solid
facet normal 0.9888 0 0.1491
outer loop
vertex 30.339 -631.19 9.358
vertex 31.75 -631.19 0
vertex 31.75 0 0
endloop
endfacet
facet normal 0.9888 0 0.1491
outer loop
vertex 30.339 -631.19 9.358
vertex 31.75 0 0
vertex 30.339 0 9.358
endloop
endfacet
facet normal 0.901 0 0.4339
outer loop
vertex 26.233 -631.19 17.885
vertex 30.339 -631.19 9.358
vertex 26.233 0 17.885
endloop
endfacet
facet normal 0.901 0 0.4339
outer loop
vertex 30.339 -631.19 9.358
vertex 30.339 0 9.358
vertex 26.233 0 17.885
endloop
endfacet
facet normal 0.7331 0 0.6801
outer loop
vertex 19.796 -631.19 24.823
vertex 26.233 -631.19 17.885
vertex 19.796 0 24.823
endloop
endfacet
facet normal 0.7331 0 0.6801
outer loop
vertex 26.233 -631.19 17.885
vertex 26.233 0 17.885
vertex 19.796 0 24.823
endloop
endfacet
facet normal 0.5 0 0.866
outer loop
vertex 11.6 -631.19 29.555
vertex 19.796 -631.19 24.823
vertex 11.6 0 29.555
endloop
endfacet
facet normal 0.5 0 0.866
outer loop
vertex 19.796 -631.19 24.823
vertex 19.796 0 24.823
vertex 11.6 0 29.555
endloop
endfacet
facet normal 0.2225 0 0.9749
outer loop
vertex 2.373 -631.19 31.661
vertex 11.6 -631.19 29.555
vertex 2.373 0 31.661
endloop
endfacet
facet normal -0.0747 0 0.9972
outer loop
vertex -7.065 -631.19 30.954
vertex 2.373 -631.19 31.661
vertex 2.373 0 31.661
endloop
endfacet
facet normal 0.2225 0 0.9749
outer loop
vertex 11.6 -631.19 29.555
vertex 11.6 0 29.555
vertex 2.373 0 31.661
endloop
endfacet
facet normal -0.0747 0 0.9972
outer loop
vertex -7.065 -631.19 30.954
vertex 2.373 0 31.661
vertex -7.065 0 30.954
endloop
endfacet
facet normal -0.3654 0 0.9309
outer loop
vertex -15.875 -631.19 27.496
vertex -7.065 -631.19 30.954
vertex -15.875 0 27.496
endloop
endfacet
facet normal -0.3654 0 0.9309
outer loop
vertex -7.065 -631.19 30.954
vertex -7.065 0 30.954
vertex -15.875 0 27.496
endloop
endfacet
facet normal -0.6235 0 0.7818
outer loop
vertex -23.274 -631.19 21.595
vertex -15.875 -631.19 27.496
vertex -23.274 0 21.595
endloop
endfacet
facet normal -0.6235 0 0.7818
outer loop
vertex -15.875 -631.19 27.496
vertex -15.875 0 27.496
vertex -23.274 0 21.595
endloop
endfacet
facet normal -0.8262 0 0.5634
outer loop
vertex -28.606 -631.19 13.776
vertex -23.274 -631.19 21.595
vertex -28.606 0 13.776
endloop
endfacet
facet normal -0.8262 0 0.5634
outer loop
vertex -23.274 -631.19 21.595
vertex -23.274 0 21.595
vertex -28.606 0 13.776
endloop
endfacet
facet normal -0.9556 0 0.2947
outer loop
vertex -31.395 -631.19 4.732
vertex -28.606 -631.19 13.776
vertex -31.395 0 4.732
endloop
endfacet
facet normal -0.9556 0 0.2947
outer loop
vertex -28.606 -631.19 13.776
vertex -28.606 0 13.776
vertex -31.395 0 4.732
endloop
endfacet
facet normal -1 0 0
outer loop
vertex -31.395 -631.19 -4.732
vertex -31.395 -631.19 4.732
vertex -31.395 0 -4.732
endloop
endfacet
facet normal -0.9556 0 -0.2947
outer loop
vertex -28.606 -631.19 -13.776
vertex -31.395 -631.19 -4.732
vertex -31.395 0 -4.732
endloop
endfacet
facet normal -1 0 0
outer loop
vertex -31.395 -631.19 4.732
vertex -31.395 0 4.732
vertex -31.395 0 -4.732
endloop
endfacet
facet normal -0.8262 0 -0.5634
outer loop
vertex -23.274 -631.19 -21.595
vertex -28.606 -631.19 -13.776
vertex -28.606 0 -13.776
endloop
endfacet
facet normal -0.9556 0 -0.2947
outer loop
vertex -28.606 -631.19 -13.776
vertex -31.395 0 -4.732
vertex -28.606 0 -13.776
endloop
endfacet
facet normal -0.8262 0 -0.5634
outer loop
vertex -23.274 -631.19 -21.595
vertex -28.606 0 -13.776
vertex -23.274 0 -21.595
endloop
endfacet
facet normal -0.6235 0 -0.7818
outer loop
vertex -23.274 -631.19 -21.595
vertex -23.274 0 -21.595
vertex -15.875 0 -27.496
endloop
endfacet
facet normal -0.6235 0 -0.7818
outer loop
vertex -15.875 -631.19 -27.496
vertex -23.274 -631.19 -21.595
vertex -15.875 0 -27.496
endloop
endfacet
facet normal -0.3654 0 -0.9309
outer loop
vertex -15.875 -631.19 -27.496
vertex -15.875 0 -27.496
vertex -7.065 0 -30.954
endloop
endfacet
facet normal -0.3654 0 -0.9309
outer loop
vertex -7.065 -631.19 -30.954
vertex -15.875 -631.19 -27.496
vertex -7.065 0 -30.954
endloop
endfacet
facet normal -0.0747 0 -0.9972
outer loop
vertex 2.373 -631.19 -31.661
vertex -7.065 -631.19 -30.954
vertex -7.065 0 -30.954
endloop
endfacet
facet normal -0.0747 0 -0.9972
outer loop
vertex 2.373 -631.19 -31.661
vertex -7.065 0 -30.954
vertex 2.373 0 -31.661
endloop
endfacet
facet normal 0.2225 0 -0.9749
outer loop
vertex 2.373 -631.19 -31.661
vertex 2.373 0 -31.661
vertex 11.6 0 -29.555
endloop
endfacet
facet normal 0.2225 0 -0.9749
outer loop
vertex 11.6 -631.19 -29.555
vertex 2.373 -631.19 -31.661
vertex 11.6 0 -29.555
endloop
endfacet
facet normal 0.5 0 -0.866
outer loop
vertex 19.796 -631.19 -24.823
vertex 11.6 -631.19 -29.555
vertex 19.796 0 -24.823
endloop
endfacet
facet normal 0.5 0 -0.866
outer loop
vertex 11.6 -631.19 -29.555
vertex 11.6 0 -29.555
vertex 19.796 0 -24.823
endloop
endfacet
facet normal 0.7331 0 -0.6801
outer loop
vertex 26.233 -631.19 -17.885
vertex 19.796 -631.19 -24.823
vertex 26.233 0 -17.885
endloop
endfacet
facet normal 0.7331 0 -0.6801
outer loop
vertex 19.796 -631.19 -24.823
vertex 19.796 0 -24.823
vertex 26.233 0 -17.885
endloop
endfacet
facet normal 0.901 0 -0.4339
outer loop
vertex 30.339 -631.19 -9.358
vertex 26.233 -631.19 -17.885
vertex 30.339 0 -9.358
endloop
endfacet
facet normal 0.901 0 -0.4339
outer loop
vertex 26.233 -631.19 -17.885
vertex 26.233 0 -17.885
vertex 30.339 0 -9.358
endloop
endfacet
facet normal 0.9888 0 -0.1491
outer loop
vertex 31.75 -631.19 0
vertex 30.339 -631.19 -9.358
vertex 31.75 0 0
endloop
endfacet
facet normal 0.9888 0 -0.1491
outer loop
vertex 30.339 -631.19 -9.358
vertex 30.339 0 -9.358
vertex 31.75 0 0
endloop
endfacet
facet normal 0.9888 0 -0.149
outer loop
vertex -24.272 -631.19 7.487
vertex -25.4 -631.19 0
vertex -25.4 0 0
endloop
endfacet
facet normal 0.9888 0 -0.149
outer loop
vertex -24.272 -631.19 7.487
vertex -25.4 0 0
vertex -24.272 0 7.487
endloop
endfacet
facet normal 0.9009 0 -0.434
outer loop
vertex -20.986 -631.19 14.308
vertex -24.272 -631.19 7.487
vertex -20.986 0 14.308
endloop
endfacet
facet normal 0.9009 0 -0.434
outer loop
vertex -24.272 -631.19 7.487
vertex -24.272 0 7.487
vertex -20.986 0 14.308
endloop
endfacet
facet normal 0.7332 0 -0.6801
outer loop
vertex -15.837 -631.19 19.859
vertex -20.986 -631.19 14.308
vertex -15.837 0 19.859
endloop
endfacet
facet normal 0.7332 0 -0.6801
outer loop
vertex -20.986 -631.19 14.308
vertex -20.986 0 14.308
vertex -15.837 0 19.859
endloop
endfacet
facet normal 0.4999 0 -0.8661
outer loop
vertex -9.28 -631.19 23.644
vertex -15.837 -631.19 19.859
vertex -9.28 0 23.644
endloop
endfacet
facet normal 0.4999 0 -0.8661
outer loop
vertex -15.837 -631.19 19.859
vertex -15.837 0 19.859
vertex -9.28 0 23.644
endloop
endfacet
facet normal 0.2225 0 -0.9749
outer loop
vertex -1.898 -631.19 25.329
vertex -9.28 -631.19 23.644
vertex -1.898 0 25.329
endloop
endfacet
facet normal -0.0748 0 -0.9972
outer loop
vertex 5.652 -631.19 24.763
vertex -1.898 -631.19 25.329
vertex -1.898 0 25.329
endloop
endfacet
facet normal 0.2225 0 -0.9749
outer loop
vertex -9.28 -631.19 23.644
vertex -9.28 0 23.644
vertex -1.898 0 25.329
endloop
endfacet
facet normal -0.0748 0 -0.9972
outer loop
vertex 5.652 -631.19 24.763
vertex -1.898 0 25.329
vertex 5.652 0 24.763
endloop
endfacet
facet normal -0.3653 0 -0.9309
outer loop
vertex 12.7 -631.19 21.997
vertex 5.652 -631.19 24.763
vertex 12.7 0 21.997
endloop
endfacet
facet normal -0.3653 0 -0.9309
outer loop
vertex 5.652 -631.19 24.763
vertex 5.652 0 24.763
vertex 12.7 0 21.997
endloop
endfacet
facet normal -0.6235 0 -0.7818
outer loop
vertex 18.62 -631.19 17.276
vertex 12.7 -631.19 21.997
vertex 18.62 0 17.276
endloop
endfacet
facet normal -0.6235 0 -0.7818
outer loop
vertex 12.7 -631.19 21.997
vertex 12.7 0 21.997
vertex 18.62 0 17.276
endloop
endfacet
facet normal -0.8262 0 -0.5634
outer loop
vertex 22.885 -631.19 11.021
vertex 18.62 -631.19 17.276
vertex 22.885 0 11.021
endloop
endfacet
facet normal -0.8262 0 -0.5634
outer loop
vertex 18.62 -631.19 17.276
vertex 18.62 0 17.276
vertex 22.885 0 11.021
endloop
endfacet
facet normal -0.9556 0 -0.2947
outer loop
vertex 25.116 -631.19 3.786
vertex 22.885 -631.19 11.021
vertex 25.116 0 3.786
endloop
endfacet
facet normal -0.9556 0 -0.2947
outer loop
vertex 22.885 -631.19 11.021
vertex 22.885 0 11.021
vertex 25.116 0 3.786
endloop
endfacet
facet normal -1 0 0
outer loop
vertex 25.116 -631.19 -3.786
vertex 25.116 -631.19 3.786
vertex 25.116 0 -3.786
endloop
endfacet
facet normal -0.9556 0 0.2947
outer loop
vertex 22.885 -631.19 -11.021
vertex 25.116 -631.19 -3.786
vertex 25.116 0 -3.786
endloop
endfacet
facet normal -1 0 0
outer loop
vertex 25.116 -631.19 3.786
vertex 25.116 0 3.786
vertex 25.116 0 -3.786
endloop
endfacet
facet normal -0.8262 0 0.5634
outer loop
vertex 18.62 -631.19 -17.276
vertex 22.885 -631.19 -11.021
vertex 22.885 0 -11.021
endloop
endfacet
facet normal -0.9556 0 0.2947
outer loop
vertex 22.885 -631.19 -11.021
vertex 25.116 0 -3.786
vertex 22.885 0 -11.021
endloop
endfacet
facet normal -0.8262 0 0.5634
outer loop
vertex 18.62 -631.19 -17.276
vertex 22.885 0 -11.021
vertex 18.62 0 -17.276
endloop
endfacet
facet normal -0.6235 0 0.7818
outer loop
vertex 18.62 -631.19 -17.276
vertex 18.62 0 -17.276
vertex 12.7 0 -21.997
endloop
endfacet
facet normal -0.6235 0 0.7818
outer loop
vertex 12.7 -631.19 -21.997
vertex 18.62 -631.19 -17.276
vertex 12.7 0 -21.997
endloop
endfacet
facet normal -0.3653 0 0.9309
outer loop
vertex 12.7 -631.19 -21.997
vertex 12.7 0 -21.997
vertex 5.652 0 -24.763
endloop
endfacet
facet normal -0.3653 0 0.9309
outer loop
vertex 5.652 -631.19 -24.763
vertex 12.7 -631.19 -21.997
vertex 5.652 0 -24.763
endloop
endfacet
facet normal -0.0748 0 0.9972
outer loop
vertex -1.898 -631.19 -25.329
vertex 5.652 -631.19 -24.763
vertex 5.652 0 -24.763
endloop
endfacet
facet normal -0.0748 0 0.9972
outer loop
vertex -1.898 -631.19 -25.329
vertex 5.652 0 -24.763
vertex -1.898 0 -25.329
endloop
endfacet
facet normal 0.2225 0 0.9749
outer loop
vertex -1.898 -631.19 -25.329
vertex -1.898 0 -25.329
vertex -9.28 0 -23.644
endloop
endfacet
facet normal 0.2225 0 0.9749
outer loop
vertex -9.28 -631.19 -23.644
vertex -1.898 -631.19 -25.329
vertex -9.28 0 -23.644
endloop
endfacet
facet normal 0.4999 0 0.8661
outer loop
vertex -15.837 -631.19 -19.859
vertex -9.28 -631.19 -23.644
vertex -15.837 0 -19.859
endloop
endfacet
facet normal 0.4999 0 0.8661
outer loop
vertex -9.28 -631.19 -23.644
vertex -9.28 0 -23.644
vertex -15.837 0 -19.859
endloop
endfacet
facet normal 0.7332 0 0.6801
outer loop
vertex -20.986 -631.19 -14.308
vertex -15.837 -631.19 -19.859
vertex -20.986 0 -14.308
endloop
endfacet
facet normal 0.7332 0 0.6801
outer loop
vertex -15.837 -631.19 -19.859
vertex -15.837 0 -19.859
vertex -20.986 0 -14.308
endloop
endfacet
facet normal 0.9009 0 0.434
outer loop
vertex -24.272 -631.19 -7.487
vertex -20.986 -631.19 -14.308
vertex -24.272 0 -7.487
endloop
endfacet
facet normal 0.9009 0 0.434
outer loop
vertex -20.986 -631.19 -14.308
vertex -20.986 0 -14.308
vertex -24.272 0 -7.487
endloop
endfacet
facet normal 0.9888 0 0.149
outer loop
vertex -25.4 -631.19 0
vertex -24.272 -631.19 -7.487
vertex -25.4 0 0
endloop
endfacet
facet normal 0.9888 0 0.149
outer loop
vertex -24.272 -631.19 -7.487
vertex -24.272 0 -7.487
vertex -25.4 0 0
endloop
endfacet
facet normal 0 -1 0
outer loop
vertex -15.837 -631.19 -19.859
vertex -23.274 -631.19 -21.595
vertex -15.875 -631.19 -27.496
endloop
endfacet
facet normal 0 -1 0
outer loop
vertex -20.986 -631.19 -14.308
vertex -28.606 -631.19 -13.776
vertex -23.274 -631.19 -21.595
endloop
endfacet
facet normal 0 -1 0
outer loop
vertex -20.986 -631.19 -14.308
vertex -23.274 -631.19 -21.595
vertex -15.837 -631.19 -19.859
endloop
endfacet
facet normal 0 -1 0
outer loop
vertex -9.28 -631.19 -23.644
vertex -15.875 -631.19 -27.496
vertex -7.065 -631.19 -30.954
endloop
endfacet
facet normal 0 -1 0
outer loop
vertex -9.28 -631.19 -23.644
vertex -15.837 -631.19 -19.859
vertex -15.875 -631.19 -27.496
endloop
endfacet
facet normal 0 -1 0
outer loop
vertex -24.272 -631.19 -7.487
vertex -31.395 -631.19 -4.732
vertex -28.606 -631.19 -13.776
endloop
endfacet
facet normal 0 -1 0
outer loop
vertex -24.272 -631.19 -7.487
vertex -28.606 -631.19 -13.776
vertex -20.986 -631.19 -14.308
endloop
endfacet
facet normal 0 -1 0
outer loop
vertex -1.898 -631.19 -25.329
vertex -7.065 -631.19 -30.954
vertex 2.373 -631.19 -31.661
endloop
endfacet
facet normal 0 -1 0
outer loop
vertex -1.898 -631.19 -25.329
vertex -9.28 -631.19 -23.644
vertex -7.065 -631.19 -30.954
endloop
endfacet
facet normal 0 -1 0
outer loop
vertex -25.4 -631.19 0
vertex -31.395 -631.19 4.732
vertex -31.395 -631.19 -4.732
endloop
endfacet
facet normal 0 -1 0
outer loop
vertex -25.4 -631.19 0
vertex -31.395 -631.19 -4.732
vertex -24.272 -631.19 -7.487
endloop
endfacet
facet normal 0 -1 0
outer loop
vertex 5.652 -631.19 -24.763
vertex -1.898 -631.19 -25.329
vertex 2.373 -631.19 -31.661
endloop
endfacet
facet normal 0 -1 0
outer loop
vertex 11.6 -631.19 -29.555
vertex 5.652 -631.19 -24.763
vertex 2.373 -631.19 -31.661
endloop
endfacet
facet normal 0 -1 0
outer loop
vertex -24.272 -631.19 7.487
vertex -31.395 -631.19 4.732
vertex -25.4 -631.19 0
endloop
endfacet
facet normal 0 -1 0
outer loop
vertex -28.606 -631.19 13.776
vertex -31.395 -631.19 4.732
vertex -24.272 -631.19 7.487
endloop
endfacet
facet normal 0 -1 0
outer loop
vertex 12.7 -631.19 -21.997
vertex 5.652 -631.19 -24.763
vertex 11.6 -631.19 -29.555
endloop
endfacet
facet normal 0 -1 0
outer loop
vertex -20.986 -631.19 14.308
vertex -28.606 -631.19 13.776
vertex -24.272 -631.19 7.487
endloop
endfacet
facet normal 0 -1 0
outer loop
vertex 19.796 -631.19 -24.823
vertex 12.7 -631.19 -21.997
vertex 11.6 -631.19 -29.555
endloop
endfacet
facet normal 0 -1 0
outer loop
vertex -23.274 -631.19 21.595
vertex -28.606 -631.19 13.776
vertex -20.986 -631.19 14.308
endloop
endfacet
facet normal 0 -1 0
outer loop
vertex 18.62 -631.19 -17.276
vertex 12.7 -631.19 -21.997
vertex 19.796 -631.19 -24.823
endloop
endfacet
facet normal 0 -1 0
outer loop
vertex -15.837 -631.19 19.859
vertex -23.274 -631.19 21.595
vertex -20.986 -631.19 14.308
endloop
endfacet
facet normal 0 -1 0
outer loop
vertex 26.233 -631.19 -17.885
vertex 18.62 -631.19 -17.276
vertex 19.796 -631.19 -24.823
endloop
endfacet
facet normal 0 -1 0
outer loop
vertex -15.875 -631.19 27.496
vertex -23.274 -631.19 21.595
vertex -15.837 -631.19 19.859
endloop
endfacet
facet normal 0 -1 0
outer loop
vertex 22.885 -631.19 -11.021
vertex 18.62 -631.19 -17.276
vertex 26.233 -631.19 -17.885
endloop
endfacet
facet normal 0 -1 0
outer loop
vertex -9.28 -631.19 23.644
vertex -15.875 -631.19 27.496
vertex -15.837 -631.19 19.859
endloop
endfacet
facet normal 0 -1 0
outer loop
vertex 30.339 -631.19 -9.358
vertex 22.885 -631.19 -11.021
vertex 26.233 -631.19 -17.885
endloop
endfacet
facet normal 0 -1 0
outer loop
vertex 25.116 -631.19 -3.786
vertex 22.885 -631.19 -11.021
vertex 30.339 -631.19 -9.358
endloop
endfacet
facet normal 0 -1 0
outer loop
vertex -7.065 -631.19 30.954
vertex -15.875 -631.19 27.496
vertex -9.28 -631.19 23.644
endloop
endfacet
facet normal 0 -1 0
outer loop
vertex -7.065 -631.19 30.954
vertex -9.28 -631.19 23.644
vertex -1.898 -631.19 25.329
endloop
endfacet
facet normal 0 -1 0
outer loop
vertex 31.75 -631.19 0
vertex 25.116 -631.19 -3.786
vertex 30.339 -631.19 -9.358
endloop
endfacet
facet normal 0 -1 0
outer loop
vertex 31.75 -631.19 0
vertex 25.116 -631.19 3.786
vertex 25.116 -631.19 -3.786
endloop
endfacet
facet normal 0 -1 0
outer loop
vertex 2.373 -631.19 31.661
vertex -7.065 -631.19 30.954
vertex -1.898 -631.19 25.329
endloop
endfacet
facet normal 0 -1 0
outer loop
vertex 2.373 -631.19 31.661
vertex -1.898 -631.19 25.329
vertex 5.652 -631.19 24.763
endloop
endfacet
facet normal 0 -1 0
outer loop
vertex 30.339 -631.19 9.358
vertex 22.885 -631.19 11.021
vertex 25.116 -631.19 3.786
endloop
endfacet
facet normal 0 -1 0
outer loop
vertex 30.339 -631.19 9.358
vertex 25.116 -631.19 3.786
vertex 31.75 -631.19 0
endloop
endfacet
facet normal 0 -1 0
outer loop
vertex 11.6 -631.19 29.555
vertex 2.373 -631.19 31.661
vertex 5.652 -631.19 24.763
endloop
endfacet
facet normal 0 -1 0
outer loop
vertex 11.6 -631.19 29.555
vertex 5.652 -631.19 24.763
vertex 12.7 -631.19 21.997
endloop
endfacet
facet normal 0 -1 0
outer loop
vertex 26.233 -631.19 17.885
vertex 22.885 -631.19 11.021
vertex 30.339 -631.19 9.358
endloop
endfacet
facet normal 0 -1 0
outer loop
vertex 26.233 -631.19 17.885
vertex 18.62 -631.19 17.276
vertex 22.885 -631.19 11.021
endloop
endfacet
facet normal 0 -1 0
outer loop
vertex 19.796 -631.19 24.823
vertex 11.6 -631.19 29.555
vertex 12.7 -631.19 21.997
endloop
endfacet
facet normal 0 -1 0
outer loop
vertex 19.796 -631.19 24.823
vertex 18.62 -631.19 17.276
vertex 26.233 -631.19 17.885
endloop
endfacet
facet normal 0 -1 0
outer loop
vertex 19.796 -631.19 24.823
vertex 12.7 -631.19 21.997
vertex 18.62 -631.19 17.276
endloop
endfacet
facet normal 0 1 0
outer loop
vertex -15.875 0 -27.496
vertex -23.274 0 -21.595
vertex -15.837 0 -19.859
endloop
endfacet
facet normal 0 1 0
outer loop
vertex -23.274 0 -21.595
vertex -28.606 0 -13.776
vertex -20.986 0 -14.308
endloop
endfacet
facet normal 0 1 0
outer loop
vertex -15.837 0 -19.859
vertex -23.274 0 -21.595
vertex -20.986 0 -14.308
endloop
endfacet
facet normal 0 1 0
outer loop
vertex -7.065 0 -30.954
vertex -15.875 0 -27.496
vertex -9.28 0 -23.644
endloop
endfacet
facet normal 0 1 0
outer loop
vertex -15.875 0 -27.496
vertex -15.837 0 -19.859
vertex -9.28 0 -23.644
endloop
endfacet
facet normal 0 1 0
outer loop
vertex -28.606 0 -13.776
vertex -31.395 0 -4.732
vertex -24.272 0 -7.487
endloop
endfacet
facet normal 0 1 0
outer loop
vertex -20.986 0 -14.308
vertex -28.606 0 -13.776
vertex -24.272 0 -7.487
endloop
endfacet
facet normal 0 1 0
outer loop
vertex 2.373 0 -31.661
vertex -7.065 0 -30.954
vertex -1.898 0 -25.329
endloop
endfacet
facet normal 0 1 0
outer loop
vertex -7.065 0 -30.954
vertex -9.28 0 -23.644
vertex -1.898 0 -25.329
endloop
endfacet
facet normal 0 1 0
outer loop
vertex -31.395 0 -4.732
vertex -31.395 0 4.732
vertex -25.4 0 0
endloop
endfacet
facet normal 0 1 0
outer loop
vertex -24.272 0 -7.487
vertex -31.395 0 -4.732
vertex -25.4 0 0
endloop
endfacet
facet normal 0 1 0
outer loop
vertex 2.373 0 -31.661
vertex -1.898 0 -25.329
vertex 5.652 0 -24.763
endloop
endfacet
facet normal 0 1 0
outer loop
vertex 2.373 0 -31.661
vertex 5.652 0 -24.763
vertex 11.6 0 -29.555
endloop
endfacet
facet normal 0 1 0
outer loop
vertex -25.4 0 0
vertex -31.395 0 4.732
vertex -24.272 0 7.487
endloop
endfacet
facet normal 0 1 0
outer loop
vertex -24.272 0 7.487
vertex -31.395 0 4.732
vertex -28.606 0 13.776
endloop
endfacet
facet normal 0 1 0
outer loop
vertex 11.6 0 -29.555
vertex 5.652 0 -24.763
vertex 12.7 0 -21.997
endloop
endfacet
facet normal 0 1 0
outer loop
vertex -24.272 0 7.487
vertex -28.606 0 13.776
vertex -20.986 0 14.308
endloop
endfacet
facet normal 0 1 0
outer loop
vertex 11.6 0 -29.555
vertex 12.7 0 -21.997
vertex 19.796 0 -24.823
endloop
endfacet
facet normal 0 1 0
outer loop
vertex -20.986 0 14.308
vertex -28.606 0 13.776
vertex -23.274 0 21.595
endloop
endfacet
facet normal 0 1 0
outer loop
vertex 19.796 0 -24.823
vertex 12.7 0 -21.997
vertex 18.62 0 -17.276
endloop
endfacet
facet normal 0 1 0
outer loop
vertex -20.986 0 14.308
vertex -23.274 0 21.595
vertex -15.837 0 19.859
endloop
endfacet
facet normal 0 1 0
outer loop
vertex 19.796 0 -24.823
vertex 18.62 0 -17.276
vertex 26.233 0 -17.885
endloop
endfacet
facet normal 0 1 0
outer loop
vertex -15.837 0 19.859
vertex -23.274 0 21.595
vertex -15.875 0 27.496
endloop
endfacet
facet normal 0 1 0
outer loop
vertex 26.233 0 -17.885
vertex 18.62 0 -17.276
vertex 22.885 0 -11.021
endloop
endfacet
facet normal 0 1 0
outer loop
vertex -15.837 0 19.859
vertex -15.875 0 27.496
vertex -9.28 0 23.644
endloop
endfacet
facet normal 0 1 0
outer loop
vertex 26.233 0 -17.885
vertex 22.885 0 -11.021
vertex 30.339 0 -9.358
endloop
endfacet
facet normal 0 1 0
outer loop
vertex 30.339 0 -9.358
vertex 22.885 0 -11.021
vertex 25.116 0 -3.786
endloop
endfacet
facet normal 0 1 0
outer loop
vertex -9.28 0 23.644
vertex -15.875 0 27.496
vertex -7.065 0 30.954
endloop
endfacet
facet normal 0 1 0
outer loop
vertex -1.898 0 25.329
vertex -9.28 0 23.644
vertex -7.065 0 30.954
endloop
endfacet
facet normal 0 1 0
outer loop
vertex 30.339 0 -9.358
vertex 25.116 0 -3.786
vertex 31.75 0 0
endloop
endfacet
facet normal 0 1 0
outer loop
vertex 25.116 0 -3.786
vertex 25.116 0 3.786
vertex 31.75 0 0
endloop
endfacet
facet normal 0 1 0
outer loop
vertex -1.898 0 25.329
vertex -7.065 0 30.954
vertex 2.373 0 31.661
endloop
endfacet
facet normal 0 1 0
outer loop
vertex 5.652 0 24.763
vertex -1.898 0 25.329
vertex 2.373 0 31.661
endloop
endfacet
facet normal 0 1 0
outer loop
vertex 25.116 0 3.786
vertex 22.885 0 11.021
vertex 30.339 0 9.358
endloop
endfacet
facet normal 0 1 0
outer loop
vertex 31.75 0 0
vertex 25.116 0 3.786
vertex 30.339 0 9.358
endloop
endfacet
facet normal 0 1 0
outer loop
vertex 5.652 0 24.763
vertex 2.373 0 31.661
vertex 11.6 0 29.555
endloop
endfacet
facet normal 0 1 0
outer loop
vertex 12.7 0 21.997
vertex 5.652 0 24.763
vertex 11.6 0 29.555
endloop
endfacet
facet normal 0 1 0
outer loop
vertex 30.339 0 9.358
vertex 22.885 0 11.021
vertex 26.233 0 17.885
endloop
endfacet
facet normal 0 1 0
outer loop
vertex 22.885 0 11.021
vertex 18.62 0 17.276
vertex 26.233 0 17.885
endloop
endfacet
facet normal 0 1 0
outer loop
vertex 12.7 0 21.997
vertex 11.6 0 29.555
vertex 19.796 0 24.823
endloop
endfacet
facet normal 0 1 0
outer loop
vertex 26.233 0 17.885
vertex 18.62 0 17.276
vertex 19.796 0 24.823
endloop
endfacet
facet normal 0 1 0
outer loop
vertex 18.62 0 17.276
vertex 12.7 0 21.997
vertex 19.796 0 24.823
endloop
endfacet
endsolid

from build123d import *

# Parameters (mm, degrees)
F0_R     = 31.75
F1_DEPTH = 304.8
F2_R     = 25.4
F3_DEPTH = 304.8
F4_DEPTH = 326.39


with BuildPart() as f1:
    # F0 (on Front) → F1 (new body)
    with BuildSketch(Plane.XZ):
        Circle(F0_R)
    extrude(amount=F1_DEPTH)

    # F2 (on face) → F3 (cut)
    with BuildSketch(Plane(origin=(0, 0, 0), x_dir=(-1, 0, 0), z_dir=(0, 1, 0))):
        Circle(F2_R)
    extrude(amount=-F3_DEPTH, mode=Mode.SUBTRACT)

    # F4 (add): a face of the model
    f4_faces = [f1.faces().sort_by_distance(p)[0] for p in [
        (-30.8519743879, -304.8, 0),
    ]]
    extrude(f4_faces, amount=F4_DEPTH)


solid = f1.part
